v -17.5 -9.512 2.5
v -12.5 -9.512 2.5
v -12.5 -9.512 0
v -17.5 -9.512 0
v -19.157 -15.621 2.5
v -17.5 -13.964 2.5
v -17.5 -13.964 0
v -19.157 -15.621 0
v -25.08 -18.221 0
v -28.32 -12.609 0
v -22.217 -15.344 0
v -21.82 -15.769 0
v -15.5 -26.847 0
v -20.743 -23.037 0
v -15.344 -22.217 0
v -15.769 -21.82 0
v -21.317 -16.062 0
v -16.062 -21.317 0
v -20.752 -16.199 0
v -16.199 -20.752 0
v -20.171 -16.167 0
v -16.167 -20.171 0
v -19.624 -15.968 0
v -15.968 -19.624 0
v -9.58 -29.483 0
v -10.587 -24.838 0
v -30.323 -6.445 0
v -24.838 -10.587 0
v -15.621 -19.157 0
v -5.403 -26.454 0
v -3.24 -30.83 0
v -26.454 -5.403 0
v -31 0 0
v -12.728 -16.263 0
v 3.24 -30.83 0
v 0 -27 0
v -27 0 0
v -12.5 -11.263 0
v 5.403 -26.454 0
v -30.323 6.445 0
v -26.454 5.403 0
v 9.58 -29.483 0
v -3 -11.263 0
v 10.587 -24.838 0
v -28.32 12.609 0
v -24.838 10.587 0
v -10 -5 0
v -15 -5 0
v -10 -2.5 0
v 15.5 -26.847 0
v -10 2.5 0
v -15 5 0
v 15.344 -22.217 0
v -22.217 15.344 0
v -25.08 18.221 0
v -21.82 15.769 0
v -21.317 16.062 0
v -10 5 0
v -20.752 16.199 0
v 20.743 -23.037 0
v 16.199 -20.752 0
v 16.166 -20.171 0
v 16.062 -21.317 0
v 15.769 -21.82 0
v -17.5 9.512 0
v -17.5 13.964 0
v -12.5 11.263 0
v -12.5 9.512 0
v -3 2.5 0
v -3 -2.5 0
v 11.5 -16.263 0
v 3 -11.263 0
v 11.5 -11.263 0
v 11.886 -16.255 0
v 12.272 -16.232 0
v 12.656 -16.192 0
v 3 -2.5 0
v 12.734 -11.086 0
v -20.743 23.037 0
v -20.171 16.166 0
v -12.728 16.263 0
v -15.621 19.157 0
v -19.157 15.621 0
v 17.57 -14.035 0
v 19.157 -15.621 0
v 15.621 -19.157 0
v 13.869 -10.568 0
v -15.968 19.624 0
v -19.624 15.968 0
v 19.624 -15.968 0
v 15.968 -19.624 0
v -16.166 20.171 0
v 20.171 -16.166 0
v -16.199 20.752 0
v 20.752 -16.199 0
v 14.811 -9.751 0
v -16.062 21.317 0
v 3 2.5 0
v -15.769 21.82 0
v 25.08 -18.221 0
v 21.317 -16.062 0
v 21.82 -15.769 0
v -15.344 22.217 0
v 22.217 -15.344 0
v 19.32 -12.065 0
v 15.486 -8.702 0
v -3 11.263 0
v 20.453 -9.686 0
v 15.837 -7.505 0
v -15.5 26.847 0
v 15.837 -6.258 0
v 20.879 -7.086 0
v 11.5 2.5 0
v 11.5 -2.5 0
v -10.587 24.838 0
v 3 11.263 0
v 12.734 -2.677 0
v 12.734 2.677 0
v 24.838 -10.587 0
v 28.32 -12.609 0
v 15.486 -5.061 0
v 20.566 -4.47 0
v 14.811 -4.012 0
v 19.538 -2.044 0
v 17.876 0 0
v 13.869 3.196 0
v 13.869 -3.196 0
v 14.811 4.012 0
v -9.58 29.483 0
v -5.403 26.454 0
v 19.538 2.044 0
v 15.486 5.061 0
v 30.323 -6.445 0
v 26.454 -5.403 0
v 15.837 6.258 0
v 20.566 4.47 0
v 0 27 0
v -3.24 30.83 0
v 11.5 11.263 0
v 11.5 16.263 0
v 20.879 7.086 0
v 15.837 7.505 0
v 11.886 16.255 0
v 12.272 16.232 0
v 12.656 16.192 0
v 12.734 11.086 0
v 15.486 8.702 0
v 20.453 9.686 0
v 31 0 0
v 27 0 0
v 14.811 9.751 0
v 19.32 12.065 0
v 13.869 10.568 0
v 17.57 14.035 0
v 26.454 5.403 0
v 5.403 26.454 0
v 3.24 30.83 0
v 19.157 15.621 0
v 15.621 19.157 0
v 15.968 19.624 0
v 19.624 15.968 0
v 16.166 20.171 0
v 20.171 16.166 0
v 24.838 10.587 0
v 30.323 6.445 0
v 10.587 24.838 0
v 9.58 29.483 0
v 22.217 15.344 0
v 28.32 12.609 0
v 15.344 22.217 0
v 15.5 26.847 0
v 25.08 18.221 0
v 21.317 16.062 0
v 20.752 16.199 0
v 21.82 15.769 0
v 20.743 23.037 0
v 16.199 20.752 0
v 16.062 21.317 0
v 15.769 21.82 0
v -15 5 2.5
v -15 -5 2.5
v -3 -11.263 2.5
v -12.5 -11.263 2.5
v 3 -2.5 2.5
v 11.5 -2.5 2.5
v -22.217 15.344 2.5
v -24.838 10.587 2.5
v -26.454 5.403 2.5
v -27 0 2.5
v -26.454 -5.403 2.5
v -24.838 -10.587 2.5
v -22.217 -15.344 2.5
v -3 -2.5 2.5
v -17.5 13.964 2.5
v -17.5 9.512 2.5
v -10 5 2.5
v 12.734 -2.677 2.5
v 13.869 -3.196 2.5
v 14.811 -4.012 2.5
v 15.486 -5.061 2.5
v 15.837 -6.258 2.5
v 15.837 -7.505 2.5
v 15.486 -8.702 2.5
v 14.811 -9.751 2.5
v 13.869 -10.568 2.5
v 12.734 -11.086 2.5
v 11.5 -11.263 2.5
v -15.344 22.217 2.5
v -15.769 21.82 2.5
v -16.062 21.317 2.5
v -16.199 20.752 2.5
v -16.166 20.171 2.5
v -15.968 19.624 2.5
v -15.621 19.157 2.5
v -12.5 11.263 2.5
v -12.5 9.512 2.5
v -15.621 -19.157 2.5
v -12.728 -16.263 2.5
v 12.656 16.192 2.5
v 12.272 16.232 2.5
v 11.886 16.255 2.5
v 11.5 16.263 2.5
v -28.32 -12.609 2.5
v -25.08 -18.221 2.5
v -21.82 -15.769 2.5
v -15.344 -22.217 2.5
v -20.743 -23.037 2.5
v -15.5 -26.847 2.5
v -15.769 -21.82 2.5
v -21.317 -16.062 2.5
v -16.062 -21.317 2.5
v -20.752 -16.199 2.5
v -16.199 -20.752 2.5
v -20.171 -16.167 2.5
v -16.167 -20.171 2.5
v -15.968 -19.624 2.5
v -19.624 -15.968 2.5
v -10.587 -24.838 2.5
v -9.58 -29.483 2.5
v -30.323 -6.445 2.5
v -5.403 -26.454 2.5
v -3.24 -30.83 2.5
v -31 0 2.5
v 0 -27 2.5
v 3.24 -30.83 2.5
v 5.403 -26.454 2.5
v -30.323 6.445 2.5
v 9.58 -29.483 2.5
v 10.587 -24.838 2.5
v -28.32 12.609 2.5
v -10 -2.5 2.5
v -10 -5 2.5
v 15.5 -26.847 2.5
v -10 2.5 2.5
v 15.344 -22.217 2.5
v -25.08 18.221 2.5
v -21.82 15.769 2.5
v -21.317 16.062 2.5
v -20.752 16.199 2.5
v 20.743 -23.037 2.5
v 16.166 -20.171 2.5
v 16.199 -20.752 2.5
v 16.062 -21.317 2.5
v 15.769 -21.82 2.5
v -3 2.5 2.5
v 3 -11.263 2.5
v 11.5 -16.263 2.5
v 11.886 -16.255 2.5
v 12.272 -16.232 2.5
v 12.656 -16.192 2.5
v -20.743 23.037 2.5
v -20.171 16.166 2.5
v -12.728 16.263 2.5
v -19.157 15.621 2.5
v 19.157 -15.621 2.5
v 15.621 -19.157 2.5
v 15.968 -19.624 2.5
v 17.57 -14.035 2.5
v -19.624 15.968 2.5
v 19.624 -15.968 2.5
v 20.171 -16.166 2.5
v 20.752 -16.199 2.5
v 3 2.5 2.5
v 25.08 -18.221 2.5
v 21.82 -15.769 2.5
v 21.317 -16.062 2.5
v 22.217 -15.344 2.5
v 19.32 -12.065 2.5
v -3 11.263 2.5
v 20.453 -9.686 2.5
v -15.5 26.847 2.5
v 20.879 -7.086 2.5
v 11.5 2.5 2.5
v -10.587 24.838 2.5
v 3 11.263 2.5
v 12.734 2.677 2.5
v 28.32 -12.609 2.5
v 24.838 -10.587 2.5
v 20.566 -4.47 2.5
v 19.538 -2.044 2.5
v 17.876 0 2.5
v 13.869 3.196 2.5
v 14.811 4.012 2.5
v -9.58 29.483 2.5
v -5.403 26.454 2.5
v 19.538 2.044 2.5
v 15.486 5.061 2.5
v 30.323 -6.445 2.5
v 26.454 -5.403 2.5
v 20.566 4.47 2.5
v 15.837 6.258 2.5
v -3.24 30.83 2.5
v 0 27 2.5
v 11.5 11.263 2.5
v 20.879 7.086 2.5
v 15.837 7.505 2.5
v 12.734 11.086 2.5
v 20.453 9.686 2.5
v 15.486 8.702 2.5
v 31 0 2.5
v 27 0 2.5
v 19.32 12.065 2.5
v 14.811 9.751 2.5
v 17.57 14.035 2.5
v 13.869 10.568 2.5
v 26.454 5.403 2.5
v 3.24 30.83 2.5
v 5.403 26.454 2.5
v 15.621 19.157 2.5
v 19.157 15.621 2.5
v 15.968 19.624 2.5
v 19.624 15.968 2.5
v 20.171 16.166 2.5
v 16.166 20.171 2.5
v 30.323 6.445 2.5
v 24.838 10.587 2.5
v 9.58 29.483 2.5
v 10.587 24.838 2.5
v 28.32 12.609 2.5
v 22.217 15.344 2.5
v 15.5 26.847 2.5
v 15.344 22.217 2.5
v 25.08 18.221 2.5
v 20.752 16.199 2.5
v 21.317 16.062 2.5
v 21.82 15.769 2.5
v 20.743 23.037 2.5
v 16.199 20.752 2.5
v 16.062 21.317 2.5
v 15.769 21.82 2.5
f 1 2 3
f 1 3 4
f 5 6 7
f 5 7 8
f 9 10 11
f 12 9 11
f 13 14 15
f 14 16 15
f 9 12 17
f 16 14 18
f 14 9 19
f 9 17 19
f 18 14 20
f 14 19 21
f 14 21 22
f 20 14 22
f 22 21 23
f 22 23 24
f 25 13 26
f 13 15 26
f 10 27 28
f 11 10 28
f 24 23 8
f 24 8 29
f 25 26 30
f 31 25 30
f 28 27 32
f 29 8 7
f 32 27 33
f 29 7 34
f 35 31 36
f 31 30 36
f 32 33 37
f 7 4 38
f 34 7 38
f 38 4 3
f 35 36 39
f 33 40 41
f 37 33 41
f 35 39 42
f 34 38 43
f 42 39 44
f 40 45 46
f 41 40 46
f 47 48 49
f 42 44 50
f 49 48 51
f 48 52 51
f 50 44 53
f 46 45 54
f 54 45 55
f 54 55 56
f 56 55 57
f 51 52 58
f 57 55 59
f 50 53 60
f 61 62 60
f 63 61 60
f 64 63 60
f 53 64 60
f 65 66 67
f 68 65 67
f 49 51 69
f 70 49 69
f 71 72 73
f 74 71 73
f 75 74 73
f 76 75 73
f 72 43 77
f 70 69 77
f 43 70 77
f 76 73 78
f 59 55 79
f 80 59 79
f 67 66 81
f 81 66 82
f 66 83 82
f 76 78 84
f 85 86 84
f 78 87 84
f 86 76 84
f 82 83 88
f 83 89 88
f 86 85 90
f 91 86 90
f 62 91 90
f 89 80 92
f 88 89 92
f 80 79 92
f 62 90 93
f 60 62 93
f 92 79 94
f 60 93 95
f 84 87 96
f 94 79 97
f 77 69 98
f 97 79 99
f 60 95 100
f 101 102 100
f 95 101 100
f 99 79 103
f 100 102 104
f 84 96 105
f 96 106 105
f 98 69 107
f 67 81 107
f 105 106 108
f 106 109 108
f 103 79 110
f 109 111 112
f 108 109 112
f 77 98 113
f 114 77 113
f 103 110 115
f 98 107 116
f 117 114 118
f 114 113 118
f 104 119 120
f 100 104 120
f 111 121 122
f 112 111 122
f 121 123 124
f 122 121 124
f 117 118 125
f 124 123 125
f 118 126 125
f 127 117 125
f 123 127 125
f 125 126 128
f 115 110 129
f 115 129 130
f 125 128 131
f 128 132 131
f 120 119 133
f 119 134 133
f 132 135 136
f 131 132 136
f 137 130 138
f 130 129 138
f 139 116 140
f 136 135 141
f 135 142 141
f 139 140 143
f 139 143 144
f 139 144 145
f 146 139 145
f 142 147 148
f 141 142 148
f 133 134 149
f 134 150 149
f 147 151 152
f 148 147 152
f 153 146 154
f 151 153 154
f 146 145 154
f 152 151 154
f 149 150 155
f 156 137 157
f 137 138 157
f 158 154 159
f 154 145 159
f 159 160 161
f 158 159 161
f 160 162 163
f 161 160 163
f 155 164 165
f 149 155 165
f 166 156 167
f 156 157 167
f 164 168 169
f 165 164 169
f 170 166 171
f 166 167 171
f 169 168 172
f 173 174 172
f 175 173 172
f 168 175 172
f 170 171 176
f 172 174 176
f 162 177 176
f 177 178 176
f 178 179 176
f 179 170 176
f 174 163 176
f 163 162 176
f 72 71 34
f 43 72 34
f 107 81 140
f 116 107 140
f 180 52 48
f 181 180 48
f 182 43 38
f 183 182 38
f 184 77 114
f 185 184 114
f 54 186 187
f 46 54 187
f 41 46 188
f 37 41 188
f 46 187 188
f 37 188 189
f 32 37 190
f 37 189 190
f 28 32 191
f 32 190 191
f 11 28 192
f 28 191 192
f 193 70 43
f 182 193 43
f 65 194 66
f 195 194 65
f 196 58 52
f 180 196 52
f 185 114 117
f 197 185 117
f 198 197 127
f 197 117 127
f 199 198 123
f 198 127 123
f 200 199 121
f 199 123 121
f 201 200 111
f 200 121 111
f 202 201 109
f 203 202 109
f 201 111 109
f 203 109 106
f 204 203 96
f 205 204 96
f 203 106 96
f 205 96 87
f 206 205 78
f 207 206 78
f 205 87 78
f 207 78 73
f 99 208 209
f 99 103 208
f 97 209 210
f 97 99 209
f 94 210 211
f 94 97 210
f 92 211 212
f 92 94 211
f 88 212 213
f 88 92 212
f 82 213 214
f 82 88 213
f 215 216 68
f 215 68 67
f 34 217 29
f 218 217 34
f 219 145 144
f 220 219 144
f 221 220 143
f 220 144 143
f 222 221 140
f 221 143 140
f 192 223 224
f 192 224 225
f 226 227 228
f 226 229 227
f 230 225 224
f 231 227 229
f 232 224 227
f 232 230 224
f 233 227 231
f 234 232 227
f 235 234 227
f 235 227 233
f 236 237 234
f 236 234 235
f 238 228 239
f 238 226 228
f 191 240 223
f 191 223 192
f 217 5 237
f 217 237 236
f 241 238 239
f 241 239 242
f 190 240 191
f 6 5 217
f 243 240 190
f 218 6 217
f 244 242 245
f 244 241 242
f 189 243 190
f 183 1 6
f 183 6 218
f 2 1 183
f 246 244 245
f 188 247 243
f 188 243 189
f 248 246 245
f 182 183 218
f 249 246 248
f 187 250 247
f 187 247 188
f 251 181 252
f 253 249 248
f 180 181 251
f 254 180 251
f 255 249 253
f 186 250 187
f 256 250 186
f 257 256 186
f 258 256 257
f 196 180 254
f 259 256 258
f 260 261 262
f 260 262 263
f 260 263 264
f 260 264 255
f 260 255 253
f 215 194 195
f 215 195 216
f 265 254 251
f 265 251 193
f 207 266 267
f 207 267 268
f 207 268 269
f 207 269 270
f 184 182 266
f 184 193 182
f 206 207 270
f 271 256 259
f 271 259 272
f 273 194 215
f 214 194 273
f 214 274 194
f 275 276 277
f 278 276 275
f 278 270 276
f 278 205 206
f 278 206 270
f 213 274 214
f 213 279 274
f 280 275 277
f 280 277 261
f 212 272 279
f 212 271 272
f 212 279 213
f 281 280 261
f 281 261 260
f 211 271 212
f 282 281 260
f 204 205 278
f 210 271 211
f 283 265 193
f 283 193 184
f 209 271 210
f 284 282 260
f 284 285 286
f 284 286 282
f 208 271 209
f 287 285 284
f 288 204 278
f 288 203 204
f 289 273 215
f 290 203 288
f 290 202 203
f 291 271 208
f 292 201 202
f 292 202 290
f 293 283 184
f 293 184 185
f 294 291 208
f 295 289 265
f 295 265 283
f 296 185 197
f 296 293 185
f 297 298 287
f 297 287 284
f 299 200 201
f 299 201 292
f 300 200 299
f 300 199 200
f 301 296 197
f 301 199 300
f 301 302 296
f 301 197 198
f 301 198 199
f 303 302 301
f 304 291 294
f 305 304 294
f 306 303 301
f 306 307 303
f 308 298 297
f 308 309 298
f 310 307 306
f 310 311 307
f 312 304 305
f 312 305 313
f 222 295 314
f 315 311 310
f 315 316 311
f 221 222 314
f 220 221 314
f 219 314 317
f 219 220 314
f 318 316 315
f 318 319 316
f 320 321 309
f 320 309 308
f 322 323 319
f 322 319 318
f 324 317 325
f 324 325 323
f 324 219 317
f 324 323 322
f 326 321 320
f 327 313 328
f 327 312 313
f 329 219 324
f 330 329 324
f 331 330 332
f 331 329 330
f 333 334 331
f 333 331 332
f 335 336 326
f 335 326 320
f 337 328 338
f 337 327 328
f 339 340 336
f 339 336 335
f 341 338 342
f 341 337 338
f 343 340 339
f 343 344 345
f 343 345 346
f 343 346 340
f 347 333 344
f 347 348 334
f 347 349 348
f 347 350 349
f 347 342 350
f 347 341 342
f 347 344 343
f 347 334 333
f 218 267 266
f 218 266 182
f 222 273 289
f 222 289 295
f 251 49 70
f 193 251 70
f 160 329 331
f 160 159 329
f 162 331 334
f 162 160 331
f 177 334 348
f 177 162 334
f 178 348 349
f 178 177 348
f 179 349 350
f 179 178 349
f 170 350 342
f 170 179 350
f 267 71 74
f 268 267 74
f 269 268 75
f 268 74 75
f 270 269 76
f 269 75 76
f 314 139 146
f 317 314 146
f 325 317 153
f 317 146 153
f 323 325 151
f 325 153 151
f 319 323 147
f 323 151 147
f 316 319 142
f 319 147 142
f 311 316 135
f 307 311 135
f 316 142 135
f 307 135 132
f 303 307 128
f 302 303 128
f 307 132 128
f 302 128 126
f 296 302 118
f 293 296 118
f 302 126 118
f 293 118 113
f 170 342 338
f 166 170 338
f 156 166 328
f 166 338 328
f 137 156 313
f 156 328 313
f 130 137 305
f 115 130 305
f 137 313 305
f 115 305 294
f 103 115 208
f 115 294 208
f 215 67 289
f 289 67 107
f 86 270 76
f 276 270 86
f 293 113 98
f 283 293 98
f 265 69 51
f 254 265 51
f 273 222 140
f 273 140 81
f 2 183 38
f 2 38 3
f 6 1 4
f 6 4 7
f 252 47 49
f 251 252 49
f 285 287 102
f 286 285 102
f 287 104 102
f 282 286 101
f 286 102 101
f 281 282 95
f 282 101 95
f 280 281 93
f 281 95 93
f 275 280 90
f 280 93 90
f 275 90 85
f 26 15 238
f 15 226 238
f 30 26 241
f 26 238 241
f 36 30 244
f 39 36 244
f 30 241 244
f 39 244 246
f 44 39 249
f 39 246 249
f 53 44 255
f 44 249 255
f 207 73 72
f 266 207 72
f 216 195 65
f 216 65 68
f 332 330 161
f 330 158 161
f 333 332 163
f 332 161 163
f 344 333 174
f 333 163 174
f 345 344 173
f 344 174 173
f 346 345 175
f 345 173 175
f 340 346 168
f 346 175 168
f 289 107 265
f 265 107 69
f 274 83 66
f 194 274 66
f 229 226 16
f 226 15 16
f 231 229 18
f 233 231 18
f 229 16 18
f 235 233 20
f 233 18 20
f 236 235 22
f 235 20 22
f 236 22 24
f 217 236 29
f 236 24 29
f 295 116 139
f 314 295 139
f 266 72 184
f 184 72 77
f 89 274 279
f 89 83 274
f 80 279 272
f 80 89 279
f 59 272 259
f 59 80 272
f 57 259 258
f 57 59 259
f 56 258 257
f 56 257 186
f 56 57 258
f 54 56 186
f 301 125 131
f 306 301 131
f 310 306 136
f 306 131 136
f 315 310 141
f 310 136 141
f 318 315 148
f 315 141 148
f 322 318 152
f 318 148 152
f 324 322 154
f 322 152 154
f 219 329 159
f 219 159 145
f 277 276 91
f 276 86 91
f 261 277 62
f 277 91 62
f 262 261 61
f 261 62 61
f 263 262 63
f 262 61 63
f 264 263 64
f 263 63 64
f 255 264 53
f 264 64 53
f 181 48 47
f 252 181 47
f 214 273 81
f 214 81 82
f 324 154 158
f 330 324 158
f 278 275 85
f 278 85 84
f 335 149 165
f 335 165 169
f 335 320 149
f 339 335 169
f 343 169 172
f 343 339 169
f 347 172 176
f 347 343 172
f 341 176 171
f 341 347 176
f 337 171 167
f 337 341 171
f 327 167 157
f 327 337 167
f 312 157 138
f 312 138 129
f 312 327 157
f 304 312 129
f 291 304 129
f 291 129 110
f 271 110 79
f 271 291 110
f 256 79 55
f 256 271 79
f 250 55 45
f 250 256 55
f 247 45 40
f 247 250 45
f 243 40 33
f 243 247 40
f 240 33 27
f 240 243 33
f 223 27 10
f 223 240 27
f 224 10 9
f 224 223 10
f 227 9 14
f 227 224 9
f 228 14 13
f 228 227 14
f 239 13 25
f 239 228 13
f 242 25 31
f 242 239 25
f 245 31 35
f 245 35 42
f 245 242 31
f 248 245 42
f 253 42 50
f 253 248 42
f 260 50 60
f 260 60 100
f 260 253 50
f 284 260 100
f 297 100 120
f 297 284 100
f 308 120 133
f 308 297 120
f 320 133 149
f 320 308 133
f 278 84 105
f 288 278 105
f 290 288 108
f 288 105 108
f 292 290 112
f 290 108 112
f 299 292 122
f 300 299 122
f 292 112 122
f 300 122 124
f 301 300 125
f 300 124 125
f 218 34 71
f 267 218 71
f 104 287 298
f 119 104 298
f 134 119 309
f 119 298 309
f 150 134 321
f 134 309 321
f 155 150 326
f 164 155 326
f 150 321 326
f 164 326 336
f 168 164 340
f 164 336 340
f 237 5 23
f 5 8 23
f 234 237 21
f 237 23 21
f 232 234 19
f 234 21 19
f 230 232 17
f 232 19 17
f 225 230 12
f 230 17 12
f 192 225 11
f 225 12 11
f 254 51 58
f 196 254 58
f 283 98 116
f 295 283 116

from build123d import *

# Parameters (mm, degrees)
F0_W     = 4
F0_H     = 2.5
F3_DEPTH = 2.5
F5_DEPTH = 2.5
F7_DEPTH = 2.5
F8_R     = 2
F9_R     = 2
F10_R    = 2
F11_R    = 2


with BuildPart() as f1:
    # F0 (on Front) → F1 (revolve)
    with BuildSketch(Plane.XZ):
        with Locations((29, 1.25)):
            Rectangle(F0_W, F0_H)
    revolve(axis=Axis((0, 0, 8.2326699048), (0, 0, 1)))



with BuildPart() as f3:
    # F2 (on Top) → F3 (new body, through all)
    with BuildSketch(Plane.XY):
        with BuildLine():
            Line((11.5, 16.2634559673), (-16.2634559673, 16.2634559673))
            Line((-16.2634559673, 16.2634559673), (-16.2634559673, 11.2634559673))
            Line((-16.2634559673, 11.2634559673), (-3, 11.2634559673))
            Line((-3, 11.2634559673), (-3, 2.5))
            Line((-3, 2.5), (-10, 2.5))
            Line((-10, 2.5), (-10, 5))
            Line((-10, 5), (-15, 5))
            Line((-15, 5), (-15, -5))
            Line((-15, -5), (-10, -5))
            Line((-10, -5), (-10, -2.5))
            Line((-10, -2.5), (-3, -2.5))
            Line((-3, -2.5), (-3, -11.2634559673))
            Line((-3, -11.2634559673), (-16.2634559673, -11.2634559673))
            Line((-16.2634559673, -11.2634559673), (-16.2634559673, -16.2634559673))
            Line((-16.2634559673, -16.2634559673), (11.5, -16.2634559673))
            ThreePointArc((11.5, -16.2634559673), (20.2343952269, -10.3062221039), (17.8764127782, 0))
            ThreePointArc((17.8764127782, 0), (20.2343952269, 10.3062221039), (11.5, 16.2634559673))
        make_face()
        with BuildLine():
            ThreePointArc((11.5, -2.5), (15.8817279836, -6.8817279836), (11.5, -11.2634559673))
            Line((11.5, -11.2634559673), (3, -11.2634559673))
            Line((3, -11.2634559673), (3, -2.5))
            Line((3, -2.5), (11.5, -2.5))
        make_face(mode=Mode.SUBTRACT)
        with BuildLine():
            Line((11.5, 2.5), (3, 2.5))
            Line((3, 2.5), (3, 11.2634559673))
            Line((3, 11.2634559673), (11.5, 11.2634559673))
            ThreePointArc((11.5, 11.2634559673), (15.8817279836, 6.8817279836), (11.5, 2.5))
        make_face(mode=Mode.SUBTRACT)
    extrude(amount=F3_DEPTH)

    # F4 (on face) → F5 (join, through all)
    with BuildSketch(Plane.XY.offset(2.5)):
        Polygon((-17.5, 9.5115462318), (-12.5, 9.5115462318), (-12.5, 11.2634559673), (-16.2634559673, 11.2634559673), (-16.2634559673, 16.2634559673), (-17.5, 16.2634559673), align=None)
        Polygon((-16.2634559673, -11.2634559673), (-12.5, -11.2634559673), (-12.5, -9.5115462318), (-17.5, -9.5115462318), (-17.5, -16.2634559673), (-16.2634559673, -16.2634559673), align=None)
    extrude(amount=-F5_DEPTH)


with BuildPart() as f1_1:
    add(f1.part)

    add(f3.part)  # F7 merges F3
    # F6 (on face) → F7 (join, through all)
    with BuildSketch(Plane.XY.offset(2.5)):
        with BuildLine():
            Line((-12.2809633628, 15.8164972687), (-17.2420989066, 20.7776328126))
            ThreePointArc((-17.2420989066, 20.7776328126), (-19.091883092, 19.091883092), (-20.7776328126, 17.2420989066))
            Line((-20.7776328126, 17.2420989066), (-15.8164972687, 12.2809633628))
            Line((-15.8164972687, 12.2809633628), (-12.2809633628, 15.8164972687))
        make_face()
        with BuildLine():
            ThreePointArc((20.7776328126, 17.2420989066), (19.091883092, 19.091883092), (17.2420989066, 20.7776328126))
            Line((17.2420989066, 20.7776328126), (11.4683862851, 15.0039201911))
            Line((11.4683862851, 15.0039201911), (15.0039201911, 11.4683862851))
            Line((15.0039201911, 11.4683862851), (20.7776328126, 17.2420989066))
        make_face()
        with BuildLine():
            ThreePointArc((17.2420989066, -20.7776328126), (19.091883092, -19.091883092), (20.7776328126, -17.2420989066))
            Line((20.7776328126, -17.2420989066), (15.277879572, -11.742345666))
            Line((15.277879572, -11.742345666), (11.742345666, -15.277879572))
            Line((11.742345666, -15.277879572), (17.2420989066, -20.7776328126))
        make_face()
        with BuildLine():
            Line((-15.6028734736, -12.0673543775), (-20.7776260963, -17.2421070001))
            ThreePointArc((-20.7776260963, -17.2421070001), (-19.091883092, -19.091883092), (-17.2421070001, -20.7776260963))
            Line((-17.2421070001, -20.7776260963), (-12.057121052, -15.5926401481))
            Line((-12.057121052, -15.5926401481), (-15.6028734736, -12.0673543775))
        make_face()
    extrude(amount=-F7_DEPTH)

    # F8
    f8_edges = [f1_1.edges().sort_by_distance(p)[0] for p in [
        (-17.242099, 20.777633, 1.25),
        (17.242099, 20.777633, 1.25),
    ]]
    fillet(f8_edges, radius=F8_R)

    # F9
    f9_edges = [f1_1.edges().sort_by_distance(p)[0] for p in [
        (-20.777633, 17.242099, 1.25),
        (-20.777626, -17.242107, 1.25),
    ]]
    fillet(f9_edges, radius=F9_R)

    # F10
    f10_edges = [f1_1.edges().sort_by_distance(p)[0] for p in [
        (-17.242107, -20.777626, 1.25),
        (17.242099, -20.777633, 1.25),
    ]]
    fillet(f10_edges, radius=F10_R)

    # F11
    f11_edges = [f1_1.edges().sort_by_distance(p)[0] for p in [
        (20.777633, 17.242099, 1.25),
        (20.777633, -17.242099, 1.25),
    ]]
    fillet(f11_edges, radius=F11_R)


solid = f1_1.part
